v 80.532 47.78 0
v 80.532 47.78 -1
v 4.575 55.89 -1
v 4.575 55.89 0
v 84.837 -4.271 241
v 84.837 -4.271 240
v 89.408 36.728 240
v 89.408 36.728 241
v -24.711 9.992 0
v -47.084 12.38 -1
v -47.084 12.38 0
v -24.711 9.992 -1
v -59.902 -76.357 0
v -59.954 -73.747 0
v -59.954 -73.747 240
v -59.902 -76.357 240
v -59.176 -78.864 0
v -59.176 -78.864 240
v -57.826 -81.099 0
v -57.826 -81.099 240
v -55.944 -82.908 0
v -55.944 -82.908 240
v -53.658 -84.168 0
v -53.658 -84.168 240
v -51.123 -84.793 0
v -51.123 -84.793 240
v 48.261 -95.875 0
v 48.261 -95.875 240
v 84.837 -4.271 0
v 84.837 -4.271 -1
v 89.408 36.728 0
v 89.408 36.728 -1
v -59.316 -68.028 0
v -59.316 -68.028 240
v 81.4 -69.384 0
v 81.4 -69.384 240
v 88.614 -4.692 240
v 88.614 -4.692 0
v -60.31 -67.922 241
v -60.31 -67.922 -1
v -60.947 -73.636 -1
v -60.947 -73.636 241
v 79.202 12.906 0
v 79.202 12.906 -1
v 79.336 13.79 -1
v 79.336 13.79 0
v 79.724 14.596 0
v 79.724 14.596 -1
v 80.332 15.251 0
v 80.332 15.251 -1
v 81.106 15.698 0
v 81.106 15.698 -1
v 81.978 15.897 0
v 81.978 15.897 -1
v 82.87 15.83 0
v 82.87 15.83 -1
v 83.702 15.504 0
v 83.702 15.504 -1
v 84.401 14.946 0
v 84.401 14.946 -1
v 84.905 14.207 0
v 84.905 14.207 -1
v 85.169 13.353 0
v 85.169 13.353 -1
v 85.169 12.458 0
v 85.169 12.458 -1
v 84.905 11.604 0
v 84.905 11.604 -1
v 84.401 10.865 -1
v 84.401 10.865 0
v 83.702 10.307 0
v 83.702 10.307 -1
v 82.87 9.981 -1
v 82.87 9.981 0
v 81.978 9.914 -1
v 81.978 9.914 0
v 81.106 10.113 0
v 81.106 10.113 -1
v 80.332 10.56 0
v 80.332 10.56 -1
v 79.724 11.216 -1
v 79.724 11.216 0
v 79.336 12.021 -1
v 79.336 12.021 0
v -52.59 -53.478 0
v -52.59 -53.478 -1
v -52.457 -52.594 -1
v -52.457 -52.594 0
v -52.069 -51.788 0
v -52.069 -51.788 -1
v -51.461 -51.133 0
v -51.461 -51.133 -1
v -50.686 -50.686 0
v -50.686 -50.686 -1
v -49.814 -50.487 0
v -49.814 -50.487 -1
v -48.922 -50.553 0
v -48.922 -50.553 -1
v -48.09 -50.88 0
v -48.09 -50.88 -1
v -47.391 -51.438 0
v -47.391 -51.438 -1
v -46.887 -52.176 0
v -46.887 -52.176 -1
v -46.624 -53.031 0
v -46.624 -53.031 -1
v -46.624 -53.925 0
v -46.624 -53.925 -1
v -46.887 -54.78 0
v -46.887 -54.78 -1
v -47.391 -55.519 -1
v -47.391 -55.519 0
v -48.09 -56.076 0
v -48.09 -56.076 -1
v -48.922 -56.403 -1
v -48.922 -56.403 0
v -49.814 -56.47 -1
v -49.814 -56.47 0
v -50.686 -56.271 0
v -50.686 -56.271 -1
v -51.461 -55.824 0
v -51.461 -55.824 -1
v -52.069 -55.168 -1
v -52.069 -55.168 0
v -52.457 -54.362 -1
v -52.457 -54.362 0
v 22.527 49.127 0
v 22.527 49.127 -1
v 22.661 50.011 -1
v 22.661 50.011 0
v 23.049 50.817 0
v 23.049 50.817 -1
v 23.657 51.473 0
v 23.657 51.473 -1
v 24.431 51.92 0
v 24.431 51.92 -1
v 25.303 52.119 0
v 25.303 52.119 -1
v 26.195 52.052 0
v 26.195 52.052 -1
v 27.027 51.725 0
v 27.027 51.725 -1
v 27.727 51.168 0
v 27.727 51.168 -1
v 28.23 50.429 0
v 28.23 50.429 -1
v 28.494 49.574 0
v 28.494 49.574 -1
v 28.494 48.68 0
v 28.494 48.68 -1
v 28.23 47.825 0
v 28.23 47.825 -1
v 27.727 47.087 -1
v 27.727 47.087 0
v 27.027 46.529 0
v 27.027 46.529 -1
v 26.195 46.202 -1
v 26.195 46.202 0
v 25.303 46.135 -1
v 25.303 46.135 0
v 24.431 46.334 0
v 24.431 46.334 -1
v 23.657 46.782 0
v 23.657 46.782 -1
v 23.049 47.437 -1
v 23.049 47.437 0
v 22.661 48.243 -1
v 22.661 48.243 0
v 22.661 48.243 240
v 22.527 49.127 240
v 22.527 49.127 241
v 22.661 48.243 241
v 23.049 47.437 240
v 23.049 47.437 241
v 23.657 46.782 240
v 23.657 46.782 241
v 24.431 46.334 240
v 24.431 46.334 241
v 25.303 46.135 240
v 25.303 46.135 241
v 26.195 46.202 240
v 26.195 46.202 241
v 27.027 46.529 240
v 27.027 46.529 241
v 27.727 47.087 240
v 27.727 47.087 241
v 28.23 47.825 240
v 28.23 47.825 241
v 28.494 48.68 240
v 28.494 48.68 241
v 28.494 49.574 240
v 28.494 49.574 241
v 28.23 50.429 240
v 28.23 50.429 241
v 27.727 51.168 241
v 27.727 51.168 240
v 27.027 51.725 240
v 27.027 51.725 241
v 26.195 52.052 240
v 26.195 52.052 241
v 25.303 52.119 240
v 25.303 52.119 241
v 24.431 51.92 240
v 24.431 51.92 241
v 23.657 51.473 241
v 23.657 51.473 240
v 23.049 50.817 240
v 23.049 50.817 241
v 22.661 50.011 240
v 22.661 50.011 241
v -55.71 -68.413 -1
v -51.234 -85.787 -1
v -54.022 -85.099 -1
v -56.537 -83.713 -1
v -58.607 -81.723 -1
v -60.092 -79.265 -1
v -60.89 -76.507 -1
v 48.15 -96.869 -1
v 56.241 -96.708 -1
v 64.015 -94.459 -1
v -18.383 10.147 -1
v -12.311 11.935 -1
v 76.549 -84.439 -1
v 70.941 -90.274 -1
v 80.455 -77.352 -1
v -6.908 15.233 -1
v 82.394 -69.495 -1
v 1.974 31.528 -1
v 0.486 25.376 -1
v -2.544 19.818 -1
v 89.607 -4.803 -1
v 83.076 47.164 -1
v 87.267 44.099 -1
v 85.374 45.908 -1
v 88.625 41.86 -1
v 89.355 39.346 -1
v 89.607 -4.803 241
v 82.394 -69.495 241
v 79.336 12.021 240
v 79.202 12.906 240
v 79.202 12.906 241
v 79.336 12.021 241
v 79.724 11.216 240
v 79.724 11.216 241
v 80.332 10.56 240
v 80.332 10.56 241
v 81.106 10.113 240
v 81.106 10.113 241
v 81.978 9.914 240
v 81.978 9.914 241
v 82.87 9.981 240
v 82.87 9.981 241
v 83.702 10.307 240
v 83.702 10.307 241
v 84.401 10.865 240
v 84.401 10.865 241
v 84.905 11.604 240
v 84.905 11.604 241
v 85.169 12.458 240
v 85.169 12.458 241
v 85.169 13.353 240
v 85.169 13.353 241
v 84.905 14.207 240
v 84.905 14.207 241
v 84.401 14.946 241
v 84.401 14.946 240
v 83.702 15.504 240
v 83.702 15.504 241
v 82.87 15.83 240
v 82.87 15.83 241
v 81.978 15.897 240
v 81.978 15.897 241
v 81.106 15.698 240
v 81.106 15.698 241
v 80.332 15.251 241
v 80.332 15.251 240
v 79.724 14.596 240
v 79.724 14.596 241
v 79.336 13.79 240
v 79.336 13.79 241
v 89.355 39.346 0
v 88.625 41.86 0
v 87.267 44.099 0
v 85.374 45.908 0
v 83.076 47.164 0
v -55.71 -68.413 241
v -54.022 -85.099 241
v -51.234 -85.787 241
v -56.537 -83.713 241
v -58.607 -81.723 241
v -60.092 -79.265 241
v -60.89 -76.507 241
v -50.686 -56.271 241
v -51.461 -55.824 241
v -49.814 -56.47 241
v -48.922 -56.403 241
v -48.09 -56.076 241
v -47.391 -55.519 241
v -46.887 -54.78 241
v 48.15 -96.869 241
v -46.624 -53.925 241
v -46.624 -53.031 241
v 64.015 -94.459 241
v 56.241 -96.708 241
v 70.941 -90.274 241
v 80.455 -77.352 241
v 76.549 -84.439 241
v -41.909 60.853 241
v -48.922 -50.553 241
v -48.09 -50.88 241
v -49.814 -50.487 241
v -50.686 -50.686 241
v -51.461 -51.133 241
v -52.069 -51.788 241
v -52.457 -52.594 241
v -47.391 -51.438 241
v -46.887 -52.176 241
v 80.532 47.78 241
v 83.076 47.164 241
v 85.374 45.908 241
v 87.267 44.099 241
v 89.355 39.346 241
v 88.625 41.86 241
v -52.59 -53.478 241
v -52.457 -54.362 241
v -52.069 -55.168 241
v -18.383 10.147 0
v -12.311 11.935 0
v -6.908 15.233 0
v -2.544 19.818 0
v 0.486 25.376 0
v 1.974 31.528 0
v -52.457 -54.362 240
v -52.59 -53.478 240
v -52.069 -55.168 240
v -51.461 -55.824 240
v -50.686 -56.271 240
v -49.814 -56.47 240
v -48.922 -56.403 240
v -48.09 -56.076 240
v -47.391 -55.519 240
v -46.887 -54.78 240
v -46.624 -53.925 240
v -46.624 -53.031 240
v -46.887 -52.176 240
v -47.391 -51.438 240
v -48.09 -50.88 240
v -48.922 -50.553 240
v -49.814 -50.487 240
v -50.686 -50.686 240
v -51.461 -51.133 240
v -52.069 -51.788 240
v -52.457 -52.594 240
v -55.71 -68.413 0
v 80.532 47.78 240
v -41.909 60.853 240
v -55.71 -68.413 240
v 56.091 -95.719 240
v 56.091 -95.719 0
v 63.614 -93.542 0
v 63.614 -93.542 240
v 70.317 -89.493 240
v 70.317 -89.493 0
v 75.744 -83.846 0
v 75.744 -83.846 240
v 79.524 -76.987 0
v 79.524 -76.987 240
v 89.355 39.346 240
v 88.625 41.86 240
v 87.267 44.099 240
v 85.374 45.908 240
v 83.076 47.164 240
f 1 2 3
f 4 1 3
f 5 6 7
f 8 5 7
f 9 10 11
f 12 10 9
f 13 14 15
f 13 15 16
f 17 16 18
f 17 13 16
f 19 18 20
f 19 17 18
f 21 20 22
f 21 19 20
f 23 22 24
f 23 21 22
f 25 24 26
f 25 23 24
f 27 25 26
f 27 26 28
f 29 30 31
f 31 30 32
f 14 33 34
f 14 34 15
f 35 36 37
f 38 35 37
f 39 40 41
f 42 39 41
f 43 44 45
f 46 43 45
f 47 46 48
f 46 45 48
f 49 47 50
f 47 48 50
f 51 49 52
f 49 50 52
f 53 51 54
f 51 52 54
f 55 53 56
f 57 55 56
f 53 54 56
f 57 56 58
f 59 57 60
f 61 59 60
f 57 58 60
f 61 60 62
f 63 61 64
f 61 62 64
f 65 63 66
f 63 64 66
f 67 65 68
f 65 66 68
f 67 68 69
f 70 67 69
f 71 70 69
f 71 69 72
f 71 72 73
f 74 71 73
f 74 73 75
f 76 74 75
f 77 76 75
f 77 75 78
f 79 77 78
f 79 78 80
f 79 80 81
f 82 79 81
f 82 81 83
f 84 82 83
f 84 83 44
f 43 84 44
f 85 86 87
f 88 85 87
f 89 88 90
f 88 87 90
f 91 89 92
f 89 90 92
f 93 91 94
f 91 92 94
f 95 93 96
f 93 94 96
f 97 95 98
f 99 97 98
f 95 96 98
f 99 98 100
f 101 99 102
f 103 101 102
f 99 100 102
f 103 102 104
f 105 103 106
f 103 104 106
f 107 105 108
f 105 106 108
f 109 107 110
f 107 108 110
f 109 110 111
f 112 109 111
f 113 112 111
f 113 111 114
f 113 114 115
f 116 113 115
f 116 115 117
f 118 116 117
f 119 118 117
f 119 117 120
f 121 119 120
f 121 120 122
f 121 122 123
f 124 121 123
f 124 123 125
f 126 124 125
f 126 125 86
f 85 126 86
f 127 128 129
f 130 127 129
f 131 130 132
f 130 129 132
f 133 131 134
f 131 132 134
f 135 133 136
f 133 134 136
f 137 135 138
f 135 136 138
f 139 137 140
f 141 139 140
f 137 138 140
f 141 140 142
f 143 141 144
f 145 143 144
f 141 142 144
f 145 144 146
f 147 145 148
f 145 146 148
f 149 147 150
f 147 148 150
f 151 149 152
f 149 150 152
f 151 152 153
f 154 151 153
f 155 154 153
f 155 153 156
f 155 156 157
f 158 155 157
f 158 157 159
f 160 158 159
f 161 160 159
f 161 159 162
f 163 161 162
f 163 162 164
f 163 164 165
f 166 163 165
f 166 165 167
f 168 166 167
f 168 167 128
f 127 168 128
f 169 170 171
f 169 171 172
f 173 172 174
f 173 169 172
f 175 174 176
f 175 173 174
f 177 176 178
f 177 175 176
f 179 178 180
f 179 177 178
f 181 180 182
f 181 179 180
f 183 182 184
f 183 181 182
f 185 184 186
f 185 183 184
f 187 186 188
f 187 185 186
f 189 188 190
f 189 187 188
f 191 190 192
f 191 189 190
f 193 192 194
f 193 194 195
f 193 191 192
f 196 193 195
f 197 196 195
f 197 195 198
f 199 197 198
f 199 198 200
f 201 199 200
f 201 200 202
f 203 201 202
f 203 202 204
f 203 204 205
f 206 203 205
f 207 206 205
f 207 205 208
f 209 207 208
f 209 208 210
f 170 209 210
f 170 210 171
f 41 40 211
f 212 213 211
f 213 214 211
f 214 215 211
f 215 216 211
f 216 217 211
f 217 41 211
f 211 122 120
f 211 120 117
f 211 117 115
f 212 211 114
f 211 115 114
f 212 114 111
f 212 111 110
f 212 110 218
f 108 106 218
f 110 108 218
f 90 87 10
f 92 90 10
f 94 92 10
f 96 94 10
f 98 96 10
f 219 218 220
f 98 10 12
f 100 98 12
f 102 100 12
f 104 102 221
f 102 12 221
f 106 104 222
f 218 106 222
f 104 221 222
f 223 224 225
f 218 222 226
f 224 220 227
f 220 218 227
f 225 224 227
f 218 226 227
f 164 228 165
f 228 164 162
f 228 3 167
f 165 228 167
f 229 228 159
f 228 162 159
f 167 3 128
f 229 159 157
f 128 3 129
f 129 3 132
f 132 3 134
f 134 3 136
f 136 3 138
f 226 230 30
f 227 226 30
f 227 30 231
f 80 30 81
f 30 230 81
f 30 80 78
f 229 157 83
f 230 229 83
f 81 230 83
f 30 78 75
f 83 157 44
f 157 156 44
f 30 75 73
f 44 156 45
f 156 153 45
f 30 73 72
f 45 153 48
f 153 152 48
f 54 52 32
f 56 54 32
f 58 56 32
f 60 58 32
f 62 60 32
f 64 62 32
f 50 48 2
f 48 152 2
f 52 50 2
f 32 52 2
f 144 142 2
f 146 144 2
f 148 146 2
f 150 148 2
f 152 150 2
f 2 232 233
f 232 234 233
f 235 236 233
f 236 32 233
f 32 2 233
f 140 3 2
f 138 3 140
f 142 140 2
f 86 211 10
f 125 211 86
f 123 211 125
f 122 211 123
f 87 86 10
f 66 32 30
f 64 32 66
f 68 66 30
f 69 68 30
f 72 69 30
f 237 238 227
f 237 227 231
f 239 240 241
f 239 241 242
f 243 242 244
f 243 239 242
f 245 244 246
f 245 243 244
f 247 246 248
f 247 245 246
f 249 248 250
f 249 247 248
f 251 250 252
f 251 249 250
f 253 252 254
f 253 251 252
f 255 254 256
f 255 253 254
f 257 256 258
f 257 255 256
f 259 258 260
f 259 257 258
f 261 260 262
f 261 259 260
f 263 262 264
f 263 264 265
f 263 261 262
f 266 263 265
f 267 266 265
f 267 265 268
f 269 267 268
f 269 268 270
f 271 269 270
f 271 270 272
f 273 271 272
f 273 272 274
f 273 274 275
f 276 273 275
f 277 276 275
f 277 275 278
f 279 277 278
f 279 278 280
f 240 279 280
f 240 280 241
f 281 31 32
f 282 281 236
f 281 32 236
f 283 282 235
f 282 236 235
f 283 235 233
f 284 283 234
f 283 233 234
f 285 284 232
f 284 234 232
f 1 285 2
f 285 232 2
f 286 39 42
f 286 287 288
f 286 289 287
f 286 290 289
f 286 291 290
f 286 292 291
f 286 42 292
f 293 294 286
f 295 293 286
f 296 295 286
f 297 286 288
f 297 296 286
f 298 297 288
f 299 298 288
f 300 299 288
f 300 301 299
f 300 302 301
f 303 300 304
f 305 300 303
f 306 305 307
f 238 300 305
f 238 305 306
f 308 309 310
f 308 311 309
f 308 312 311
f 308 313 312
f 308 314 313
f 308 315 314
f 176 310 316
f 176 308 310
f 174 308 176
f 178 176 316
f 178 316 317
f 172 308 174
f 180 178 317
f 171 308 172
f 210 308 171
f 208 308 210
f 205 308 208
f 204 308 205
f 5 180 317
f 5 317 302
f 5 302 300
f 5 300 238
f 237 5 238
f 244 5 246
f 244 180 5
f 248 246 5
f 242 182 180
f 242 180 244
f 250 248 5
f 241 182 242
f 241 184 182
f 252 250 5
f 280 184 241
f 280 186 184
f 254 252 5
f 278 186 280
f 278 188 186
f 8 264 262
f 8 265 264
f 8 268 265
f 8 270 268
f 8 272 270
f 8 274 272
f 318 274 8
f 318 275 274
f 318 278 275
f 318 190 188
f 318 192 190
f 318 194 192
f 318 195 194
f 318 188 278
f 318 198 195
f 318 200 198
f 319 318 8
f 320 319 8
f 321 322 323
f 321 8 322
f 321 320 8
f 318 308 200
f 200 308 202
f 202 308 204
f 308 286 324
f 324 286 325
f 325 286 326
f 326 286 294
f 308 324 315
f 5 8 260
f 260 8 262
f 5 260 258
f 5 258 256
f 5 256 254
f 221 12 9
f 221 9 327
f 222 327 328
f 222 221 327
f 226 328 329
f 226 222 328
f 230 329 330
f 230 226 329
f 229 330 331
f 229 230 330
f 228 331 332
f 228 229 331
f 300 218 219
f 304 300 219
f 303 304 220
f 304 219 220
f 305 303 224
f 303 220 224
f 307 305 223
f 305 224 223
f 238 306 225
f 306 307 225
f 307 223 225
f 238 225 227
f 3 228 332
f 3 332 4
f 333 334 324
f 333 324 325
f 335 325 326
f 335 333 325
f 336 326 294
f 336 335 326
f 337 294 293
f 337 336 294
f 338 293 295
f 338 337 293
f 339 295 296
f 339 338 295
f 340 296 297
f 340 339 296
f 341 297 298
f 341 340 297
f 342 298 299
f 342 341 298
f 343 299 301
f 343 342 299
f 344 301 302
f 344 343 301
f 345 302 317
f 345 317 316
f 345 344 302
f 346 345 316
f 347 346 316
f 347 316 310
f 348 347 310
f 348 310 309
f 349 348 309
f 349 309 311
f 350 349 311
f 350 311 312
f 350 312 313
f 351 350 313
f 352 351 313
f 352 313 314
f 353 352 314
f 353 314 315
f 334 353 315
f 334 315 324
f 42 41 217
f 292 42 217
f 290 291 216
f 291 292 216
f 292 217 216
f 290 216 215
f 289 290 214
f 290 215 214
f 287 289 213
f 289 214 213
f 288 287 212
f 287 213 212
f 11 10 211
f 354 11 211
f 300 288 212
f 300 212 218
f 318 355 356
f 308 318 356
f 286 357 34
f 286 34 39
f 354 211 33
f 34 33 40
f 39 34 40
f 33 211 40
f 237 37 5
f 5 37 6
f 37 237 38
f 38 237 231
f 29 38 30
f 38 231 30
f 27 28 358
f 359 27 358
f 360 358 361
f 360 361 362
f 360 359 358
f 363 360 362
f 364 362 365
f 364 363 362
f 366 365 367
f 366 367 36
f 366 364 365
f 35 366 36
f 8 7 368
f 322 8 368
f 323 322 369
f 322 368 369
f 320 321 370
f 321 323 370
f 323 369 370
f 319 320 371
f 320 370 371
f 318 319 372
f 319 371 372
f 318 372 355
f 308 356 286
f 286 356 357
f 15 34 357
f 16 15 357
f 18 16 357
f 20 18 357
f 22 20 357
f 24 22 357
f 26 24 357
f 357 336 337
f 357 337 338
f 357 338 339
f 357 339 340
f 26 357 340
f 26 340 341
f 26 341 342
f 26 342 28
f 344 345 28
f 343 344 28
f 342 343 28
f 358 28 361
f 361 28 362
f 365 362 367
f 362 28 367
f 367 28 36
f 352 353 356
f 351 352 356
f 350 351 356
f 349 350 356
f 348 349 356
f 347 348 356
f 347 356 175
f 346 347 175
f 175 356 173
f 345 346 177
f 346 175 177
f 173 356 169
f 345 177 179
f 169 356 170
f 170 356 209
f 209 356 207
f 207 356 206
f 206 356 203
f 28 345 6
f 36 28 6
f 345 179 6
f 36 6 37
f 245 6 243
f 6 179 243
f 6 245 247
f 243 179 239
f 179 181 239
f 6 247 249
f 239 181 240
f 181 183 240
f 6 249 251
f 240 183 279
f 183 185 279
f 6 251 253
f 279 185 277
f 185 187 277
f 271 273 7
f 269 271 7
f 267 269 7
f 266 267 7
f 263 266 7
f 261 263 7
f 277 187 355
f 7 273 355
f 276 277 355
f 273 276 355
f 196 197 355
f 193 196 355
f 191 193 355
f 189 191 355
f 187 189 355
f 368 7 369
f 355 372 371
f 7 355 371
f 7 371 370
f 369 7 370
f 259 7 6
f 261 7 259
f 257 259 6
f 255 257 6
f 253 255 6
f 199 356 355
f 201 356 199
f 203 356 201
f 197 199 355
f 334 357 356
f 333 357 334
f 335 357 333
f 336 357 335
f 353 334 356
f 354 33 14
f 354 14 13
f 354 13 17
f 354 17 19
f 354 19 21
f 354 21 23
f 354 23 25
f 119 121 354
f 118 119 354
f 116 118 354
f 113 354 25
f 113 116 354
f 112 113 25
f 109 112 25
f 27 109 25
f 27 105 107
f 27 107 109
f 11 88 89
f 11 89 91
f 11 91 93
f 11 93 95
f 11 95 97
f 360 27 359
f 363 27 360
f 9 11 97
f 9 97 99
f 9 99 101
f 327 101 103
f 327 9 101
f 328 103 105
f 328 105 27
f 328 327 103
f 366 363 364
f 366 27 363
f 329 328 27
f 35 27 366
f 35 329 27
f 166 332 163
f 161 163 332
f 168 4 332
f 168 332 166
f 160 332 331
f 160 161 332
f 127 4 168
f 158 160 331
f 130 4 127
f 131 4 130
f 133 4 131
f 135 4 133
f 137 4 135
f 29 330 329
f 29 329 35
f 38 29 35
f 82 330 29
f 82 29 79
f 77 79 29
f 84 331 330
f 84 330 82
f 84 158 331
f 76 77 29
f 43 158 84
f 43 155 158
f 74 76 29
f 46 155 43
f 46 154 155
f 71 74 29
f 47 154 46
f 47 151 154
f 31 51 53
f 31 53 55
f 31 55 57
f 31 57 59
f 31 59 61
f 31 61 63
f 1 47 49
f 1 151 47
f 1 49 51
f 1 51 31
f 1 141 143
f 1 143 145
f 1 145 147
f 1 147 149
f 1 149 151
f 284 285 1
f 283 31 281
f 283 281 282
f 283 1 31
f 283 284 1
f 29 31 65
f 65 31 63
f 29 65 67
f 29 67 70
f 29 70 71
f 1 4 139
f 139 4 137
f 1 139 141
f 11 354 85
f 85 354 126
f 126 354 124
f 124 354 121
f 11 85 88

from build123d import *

# Parameters (mm, degrees)
EXTRUDE_1_DEPTH     = 240
SHELL_1_T           = 1
CUT_EXTRUDE_1_DEPTH = 10
SKETCH_3_R          = 3.0000000000000018
SKETCH_3_R_2        = 3.000000000000008
CUT_EXTRUDE_2_DEPTH = 10
CUT_EXTRUDE_START   = -8
SKETCH_6_R          = 3.0000000000000018
SKETCH_6_R_2        = 3.000000000000008
CUT_EXTRUDE_4_DEPTH = 8


with BuildPart() as part:
    # 草图1 → 凸台-拉伸1 (new body)
    with BuildSketch(Plane.XY):
        with BuildLine():
            Line((-59.31594071221176, -68.02781651157832), (-59.9536030402972, -73.74672011248332))
            ThreePointArc((-59.9536030402972, -73.74672011248332), (-57.826283597547295, -81.098805241968), (-51.12333234290943, -84.79327248916888))
            Line((-51.12333234290943, -84.79327248916888), (48.260783027457215, -95.87468088565784))
            ThreePointArc((48.260783027457215, -95.87468088565784), (70.3170384159113, -89.49272255740806), (81.40044015751394, -69.38386879349436))
            Line((81.40044015751394, -69.38386879349436), (88.61365635961639, -4.691811108090497))
            Line((88.61365635961639, -4.691811108090497), (84.83705997568286, -4.270717589039598))
            Line((84.83705997568286, -4.270717589039598), (89.4084892426148, 36.72835377657124))
            ThreePointArc((89.4084892426148, 36.72835377657124), (87.266542040995, 44.098694219102335), (80.53170892213036, 47.77998188979318))
            Line((80.53170892213036, 47.77998188979318), (-41.90893576965496, 60.852539535143315))
            Line((-41.90893576965496, 60.852539535143315), (-55.71014158484277, -68.41279502152355))
            Line((-55.71014158484277, -68.41279502152355), (-59.190362130599055, -68.04122409572891))
            Line((-59.190362130599055, -68.04122409572891), (-59.31594071221176, -68.02781651157832))
        make_face()
    extrude(amount=EXTRUDE_1_DEPTH)

    # 抽壳1
    shell_1_openings = [part.faces().sort_by_distance(p)[0] for p in [
        (-48.809538677, -3.780127743, 120),
        (19.311386576, 54.316260712, 120),
        (87.266542041, 44.098694219, 120),
        (87.122774609, 16.228818094, 120),
        (86.725358168, -4.481264349, 120),
        (-57.513041149, -68.220305767, 120),
    ]]
    offset(amount=SHELL_1_T, openings=shell_1_openings, kind=Kind.INTERSECTION)

    # 草图2 → 切除-拉伸1 (cut)
    with BuildSketch(Plane(origin=(0, 0, -1), x_dir=(-1, 0, 0), z_dir=(0, 0, -1))):
        with BuildLine():
            Line((47.084151642276574, 12.380252393304023), (24.71130527686598, 9.991582155982451))
            ThreePointArc((24.71130527686598, 9.991582155982451), (6.908463771051354, 15.233207386949033), (-1.9736574368444393, 31.528106085354896))
            Line((-1.9736574368444393, 31.528106085354896), (-4.574653917520899, 55.88964990582092))
            Line((-4.574653917520899, 55.88964990582092), (41.90893576965496, 60.852539535143315))
            Line((41.90893576965496, 60.852539535143315), (47.084151642276574, 12.380252393304023))
        make_face()
    extrude(amount=-CUT_EXTRUDE_1_DEPTH, mode=Mode.SUBTRACT)

    # 草图3 → 切除-拉伸2 (cut)
    with BuildSketch(Plane(origin=(0, 0, -1), x_dir=(-1, 0, 0), z_dir=(0, 0, -1))):
        with Locations((-25.52734826155789, 49.12702905294972)):
            Circle(SKETCH_3_R)
        with Locations((-82.20224799889411, 12.905547308509762)):
            Circle(SKETCH_3_R_2)
        with Locations((49.590043926063395, -53.47812379490241)):
            Circle(SKETCH_3_R)
    extrude(amount=-CUT_EXTRUDE_2_DEPTH, mode=Mode.SUBTRACT)

    # 草图6 → 切除-拉伸4 (cut)
    with BuildSketch(Plane.XY.offset(241).offset(CUT_EXTRUDE_START)):
        with Locations(Location((25.52734826155789, 49.12702905294972, 0), (0, 0, 180))):
            Circle(SKETCH_6_R)
        with Locations(Location((82.20224799889411, 12.905547308509762, 0), (0, 0, 180))):
            Circle(SKETCH_6_R_2)
        with Locations(Location((-49.590043926063395, -53.47812379490241, 0), (0, 0, 180))):
            Circle(SKETCH_6_R)
    extrude(amount=CUT_EXTRUDE_4_DEPTH, mode=Mode.SUBTRACT)


solid = part.part
